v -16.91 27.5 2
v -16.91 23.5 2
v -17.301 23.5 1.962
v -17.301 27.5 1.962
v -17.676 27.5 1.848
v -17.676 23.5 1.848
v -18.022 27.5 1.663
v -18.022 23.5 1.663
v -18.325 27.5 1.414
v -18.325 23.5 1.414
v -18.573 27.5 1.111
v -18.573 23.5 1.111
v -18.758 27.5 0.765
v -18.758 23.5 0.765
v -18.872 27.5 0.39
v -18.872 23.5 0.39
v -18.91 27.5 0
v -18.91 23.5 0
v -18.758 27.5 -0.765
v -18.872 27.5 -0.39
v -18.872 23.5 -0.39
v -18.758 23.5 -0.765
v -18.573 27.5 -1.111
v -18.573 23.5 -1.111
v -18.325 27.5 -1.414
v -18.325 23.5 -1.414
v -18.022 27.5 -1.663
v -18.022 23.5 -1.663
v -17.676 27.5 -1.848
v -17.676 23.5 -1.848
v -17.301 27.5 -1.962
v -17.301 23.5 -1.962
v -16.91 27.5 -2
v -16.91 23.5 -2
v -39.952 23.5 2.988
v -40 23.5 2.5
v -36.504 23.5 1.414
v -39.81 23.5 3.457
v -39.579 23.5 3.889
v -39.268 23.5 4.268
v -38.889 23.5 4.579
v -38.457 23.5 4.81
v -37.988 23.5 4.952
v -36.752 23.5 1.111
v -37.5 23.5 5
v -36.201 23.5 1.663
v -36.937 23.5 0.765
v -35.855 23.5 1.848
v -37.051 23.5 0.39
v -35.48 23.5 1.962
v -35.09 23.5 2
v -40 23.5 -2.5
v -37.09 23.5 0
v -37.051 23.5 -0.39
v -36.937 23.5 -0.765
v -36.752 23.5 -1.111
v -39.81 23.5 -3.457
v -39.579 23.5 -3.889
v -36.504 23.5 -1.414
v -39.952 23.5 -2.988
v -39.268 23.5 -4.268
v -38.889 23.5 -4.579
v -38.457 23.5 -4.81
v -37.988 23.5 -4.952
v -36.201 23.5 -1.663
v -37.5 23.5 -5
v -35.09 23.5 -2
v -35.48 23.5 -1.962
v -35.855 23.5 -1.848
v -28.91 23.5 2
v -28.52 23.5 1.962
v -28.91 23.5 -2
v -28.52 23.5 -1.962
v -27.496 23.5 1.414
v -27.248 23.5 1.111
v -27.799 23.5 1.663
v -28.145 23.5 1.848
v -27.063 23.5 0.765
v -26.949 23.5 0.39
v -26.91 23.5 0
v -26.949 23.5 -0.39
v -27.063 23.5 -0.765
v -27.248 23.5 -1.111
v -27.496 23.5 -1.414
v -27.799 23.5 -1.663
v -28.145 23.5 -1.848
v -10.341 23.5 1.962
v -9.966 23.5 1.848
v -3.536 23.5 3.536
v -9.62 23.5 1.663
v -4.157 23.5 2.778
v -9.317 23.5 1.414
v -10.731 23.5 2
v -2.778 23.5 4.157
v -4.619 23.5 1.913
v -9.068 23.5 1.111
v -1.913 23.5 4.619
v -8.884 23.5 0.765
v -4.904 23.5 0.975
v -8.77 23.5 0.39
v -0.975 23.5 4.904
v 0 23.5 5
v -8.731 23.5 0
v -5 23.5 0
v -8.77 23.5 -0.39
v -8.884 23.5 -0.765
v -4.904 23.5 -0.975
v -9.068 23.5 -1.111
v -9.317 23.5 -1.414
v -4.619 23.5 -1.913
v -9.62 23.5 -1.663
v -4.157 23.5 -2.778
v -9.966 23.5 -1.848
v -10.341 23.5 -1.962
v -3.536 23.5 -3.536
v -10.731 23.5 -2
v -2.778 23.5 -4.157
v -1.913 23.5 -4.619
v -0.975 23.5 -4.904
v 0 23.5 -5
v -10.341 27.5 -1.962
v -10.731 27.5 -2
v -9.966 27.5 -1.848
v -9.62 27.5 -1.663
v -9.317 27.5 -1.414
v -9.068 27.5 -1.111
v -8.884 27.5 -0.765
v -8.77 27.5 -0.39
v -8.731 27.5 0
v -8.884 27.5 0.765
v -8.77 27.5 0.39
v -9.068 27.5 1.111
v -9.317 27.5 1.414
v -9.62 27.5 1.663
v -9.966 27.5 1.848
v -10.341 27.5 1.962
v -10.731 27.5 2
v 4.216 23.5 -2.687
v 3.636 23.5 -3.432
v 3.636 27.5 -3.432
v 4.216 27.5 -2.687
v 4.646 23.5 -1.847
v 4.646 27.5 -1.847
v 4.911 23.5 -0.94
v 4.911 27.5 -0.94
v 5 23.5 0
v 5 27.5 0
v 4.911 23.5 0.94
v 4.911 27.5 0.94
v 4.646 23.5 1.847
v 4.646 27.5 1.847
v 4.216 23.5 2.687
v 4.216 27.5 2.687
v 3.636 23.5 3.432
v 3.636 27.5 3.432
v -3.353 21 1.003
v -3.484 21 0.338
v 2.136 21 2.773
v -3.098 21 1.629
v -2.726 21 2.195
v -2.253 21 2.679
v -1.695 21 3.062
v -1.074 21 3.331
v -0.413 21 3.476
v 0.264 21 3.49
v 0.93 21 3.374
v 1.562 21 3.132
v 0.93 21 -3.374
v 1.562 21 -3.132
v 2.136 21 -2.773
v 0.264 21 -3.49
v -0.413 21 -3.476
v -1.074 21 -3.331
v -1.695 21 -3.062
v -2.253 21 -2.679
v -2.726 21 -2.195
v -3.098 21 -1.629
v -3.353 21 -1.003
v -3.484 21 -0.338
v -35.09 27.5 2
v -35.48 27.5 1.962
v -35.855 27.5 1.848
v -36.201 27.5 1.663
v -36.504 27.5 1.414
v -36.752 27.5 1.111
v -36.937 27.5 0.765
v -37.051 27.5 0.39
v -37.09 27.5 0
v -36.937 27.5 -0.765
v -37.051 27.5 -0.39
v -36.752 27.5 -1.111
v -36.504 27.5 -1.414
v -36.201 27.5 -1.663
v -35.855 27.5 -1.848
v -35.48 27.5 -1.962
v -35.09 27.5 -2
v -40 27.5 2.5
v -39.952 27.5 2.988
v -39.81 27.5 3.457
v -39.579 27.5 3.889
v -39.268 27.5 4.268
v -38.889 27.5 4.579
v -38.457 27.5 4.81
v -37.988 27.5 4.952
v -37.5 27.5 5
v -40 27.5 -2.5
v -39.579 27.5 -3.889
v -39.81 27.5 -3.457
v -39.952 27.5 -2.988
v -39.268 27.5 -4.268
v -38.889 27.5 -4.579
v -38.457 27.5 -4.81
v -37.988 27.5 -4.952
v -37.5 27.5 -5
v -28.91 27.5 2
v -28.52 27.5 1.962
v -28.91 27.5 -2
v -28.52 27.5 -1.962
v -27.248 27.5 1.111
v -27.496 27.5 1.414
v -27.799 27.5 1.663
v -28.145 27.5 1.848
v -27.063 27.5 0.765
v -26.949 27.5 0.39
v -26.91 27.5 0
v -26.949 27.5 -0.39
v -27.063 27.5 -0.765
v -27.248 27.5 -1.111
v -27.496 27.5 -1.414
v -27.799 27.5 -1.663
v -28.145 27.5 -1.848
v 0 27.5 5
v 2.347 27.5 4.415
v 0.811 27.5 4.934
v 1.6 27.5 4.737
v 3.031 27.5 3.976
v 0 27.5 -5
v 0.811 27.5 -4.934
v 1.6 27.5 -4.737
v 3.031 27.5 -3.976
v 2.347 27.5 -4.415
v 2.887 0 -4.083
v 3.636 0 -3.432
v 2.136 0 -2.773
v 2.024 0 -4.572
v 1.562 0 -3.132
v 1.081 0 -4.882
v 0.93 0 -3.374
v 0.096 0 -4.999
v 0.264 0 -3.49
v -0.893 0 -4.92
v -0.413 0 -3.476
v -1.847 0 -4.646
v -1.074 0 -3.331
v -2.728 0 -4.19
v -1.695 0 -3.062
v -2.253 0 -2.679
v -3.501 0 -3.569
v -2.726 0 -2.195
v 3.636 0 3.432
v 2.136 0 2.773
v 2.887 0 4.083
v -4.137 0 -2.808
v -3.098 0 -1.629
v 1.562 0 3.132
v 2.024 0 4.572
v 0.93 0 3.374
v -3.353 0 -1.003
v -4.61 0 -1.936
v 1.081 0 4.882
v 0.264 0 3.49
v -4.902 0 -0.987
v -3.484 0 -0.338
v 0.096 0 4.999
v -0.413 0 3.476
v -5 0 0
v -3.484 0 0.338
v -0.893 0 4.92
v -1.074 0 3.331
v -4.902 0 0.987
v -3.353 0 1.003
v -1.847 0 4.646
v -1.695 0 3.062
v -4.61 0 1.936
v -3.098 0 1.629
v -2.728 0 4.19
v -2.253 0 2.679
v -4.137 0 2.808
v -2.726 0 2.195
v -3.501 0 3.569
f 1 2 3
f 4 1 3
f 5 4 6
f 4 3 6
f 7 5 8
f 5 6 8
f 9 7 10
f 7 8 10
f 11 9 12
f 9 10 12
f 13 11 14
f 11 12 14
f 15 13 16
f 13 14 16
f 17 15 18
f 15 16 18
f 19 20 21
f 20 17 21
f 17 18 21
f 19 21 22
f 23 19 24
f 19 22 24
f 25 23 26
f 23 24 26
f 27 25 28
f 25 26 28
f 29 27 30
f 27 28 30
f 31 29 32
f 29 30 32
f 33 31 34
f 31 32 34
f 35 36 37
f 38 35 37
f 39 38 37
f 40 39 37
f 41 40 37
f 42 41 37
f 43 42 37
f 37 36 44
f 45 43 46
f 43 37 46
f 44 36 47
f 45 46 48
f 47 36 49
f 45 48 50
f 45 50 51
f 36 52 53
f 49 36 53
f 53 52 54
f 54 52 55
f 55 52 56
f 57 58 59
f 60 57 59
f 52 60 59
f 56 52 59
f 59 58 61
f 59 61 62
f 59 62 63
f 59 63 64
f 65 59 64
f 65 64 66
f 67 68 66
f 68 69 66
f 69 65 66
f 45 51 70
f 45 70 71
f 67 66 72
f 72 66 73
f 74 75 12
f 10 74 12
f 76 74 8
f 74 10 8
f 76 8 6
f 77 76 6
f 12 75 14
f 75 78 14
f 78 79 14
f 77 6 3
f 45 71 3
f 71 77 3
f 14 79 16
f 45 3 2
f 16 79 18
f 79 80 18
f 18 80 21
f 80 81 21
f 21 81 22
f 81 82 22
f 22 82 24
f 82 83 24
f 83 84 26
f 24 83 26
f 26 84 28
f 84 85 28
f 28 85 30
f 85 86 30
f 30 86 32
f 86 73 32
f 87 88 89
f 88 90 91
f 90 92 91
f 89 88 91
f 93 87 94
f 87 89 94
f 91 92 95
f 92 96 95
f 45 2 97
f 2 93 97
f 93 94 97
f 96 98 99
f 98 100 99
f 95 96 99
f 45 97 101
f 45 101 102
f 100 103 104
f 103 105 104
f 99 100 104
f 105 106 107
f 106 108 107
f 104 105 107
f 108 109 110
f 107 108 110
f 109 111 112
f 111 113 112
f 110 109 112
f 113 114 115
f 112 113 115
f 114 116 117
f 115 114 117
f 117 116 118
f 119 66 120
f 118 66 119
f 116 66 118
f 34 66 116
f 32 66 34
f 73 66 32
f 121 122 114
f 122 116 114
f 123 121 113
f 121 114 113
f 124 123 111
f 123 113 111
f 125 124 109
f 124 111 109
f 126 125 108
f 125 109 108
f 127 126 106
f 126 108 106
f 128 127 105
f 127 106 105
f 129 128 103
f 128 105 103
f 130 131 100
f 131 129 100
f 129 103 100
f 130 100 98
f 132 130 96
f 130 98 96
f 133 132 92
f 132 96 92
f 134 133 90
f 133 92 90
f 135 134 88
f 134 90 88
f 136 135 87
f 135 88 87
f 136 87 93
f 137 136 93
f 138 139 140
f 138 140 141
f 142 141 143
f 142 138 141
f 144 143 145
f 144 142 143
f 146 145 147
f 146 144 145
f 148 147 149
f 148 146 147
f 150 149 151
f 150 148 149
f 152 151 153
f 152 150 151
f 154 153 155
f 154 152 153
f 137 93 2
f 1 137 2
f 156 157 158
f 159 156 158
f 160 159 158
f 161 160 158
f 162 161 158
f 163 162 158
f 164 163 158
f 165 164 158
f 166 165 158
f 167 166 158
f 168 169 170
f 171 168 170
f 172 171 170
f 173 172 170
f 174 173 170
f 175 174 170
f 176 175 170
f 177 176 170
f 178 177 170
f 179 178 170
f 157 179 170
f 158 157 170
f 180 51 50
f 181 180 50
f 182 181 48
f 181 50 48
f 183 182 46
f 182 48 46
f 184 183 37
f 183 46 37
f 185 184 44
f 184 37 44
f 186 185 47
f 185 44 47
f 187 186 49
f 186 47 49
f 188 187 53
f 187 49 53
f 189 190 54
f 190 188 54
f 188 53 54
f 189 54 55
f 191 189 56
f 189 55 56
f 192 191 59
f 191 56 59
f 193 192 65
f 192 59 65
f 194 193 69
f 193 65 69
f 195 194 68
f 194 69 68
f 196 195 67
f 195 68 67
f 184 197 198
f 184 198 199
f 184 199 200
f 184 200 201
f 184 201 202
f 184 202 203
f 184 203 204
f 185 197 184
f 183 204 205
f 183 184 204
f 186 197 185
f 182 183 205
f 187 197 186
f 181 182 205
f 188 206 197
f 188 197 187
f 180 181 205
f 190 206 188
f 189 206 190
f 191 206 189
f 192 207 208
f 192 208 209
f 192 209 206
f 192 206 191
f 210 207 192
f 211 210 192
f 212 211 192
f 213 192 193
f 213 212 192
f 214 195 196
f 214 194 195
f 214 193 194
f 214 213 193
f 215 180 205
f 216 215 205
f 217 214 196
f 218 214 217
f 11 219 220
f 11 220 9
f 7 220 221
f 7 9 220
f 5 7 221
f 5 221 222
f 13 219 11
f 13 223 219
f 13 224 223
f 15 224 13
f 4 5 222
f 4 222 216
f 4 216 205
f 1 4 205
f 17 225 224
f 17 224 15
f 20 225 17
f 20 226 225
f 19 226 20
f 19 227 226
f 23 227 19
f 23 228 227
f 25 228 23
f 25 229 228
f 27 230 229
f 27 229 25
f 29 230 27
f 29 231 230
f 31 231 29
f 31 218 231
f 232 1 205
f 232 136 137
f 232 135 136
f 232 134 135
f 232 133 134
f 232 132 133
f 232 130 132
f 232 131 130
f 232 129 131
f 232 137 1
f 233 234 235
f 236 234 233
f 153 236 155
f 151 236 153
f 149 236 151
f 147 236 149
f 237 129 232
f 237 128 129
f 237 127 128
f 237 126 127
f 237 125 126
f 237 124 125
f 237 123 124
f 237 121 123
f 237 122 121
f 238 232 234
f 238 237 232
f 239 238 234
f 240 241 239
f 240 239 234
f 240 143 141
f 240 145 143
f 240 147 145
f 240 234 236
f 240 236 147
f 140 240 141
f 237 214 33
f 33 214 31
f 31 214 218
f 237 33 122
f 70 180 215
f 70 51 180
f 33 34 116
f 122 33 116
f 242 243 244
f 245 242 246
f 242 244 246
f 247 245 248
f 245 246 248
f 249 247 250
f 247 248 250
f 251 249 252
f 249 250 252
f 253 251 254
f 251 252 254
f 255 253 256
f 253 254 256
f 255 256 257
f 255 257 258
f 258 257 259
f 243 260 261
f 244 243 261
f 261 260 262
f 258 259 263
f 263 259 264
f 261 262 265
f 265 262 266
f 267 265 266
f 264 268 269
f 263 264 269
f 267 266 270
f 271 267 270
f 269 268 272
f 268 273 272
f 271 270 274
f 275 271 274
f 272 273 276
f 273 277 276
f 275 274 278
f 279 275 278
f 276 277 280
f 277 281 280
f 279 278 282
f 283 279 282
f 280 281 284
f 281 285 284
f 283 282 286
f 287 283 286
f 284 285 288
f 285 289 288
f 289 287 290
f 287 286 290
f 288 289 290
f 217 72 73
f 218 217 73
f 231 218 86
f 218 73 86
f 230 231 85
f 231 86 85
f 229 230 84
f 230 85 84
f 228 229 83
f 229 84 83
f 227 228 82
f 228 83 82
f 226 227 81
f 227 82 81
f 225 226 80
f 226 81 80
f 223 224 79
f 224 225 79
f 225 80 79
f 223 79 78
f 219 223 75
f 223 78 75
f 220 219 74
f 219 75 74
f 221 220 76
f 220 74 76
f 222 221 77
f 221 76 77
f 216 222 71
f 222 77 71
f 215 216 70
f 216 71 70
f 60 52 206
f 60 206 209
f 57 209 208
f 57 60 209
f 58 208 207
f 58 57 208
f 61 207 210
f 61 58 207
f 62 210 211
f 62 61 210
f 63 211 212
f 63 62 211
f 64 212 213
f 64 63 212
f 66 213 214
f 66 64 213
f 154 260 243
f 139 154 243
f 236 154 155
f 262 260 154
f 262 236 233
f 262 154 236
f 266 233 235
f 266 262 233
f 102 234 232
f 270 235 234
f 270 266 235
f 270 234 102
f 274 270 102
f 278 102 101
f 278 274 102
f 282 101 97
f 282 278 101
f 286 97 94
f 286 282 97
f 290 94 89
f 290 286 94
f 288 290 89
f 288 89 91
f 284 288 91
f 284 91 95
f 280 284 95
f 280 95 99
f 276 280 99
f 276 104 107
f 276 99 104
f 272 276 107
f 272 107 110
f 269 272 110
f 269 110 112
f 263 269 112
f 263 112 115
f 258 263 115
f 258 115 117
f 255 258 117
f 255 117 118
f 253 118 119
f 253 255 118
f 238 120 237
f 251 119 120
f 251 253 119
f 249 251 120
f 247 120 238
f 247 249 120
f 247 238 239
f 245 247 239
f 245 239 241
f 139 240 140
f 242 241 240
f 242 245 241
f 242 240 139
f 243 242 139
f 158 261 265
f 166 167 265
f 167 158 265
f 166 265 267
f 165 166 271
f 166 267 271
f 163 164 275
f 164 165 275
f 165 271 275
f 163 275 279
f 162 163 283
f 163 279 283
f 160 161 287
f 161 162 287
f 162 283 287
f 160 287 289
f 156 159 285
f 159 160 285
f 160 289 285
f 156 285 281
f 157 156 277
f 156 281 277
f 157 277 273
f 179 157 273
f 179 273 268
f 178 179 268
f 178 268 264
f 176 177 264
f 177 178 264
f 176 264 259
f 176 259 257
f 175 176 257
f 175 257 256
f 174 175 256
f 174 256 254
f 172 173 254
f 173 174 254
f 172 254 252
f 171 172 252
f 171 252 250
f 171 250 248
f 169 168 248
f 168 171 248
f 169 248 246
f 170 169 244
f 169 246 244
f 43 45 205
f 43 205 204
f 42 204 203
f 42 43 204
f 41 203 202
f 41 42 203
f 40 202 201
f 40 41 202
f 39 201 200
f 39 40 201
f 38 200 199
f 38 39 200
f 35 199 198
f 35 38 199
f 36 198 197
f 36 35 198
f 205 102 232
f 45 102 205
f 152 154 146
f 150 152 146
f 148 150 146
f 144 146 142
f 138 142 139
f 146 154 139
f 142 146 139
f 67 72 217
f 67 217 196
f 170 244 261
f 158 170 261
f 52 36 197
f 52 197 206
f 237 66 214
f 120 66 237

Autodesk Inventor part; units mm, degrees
ref_plane "YZ Plane" through (0, 0, 0) normal (1, 0, 0) x (0, 1, 0)
ref_plane "XZ Plane" through (0, 0, 0) normal (0, 1, 0) x (-1, 0, 0)
ref_plane "XY Plane" through (0, 0, 0) normal (0, 0, 1) x (1, 0, 0)
sketch "Sketch1" plane through (0, 0, 0) normal (0, 1, 0) x (-1, 0, 0)
  arc A0 (-2.1359, -2.7727) -> (-2.1359, 2.7727) centre (0, 0) ccw
  line L0 (3.4641, 0.5) -> (-2.1359, 0.5)
  line L1 (-2.1359, 0.5) -> (-2.1359, -2.7727)
  line L2 (-2.1359, 0.5) -> (-2.1359, 2.7727)
  line L3 (-3.6359, 3.4322) -> (-3.6359, 0.5)
  line L4 (-3.6359, 0.5) -> (-3.6359, -3.4322)
  arc A1 (-3.6359, -3.4322) -> (-3.6359, 3.4322) centre (0, 0) ccw
  dimension "d0" = 7
  dimension "d1" = 5.6
  dimension "d2" = 3
  dimension "d3" = 1.5
extrude "Extrusion1" add sketch "Sketch1" along normal blind 21
sketch "Sketch2" plane through (0, 21, 0) normal (0, 1, 0) x (1, 0, 0)
  line L0 (3.6359, -3.4322) -> (3.6359, 3.4322) projected
  arc A0 (3.6359, 3.4322) -> (3.6359, -3.4322) centre (0, 0) ccw projected
  line L1 (2.1359, 2.7727) -> (2.1359, -2.7727) projected
  arc A1 (2.1359, 2.7727) -> (2.1359, -2.7727) centre (0, 0) ccw projected
extrude "Extrusion2" add sketch "Sketch2" along normal blind 2.5 contours A0 L0 | L1 A1
sketch "Sketch4" plane through (0, 23.5, 0) normal (0, 1, 0) x (1, 0, 0)
  arc A0 (3.6359, 3.4322) -> (3.6359, -3.4322) centre (0, 0) ccw projected
  line L0 (3.6359, -3.4322) -> (3.6359, 3.4322) projected
  circle A1 centre (0, 0) radius 5
  line L1 (0, -5) -> (-37.5, -5)
  line L2 (-40, -2.5) -> (-40, 2.5)
  line L3 (-37.5, 5) -> (0, 5)
  arc A2 (-40, -2.5) -> (-37.5, -5) centre (-37.5, -2.5) ccw
  arc A3 (-37.5, 5) -> (-40, 2.5) centre (-37.5, 2.5) ccw
  line L4 (-35.0895, 0) -> (-28.9105, 0) construction
  line L5 (-35.0895, -2) -> (-28.9105, -2)
  line L6 (-28.9105, 2) -> (-35.0895, 2)
  arc A4 (-35.0895, 2) -> (-35.0895, -2) centre (-35.0895, 0) ccw
  arc A5 (-28.9105, -2) -> (-28.9105, 2) centre (-28.9105, 0) ccw
  line L7 (-22.9105, 5) -> (-22.9105, -5)
  line L8 (-10.7314, 0) -> (-16.9105, 0) construction
  line L9 (-10.7314, -2) -> (-16.9105, -2)
  line L10 (-16.9105, 2) -> (-10.7314, 2)
  arc A6 (-10.7314, -2) -> (-10.7314, 2) centre (-10.7314, 0) ccw
  arc A7 (-16.9105, 2) -> (-16.9105, -2) centre (-16.9105, 0) ccw
  point P0 (-40, -5)
  point P1 (-32, 0)
  point P2 (-40, 0)
  point P3 (-26.9105, 0)
  point P4 (-8.321, -2.5)
  point P5 (-8.321, 2.5)
  point P6 (-13.821, 0)
  point P7 (-18.9105, 0)
  point P8 (3.6359, -3.4322)
  point P9 (3.6359, 3.4322)
  dimension "d28" = 40
  dimension "d29" = 2.5
  dimension "d30" = 4
  dimension "d31" = 8
  dimension "d32" = 4
  dimension "d33" = 26.5464
extrude "Extrusion4" add sketch "Sketch4" along normal blind 4
properties part number "Sensor_Connect_Knob_Brake"
